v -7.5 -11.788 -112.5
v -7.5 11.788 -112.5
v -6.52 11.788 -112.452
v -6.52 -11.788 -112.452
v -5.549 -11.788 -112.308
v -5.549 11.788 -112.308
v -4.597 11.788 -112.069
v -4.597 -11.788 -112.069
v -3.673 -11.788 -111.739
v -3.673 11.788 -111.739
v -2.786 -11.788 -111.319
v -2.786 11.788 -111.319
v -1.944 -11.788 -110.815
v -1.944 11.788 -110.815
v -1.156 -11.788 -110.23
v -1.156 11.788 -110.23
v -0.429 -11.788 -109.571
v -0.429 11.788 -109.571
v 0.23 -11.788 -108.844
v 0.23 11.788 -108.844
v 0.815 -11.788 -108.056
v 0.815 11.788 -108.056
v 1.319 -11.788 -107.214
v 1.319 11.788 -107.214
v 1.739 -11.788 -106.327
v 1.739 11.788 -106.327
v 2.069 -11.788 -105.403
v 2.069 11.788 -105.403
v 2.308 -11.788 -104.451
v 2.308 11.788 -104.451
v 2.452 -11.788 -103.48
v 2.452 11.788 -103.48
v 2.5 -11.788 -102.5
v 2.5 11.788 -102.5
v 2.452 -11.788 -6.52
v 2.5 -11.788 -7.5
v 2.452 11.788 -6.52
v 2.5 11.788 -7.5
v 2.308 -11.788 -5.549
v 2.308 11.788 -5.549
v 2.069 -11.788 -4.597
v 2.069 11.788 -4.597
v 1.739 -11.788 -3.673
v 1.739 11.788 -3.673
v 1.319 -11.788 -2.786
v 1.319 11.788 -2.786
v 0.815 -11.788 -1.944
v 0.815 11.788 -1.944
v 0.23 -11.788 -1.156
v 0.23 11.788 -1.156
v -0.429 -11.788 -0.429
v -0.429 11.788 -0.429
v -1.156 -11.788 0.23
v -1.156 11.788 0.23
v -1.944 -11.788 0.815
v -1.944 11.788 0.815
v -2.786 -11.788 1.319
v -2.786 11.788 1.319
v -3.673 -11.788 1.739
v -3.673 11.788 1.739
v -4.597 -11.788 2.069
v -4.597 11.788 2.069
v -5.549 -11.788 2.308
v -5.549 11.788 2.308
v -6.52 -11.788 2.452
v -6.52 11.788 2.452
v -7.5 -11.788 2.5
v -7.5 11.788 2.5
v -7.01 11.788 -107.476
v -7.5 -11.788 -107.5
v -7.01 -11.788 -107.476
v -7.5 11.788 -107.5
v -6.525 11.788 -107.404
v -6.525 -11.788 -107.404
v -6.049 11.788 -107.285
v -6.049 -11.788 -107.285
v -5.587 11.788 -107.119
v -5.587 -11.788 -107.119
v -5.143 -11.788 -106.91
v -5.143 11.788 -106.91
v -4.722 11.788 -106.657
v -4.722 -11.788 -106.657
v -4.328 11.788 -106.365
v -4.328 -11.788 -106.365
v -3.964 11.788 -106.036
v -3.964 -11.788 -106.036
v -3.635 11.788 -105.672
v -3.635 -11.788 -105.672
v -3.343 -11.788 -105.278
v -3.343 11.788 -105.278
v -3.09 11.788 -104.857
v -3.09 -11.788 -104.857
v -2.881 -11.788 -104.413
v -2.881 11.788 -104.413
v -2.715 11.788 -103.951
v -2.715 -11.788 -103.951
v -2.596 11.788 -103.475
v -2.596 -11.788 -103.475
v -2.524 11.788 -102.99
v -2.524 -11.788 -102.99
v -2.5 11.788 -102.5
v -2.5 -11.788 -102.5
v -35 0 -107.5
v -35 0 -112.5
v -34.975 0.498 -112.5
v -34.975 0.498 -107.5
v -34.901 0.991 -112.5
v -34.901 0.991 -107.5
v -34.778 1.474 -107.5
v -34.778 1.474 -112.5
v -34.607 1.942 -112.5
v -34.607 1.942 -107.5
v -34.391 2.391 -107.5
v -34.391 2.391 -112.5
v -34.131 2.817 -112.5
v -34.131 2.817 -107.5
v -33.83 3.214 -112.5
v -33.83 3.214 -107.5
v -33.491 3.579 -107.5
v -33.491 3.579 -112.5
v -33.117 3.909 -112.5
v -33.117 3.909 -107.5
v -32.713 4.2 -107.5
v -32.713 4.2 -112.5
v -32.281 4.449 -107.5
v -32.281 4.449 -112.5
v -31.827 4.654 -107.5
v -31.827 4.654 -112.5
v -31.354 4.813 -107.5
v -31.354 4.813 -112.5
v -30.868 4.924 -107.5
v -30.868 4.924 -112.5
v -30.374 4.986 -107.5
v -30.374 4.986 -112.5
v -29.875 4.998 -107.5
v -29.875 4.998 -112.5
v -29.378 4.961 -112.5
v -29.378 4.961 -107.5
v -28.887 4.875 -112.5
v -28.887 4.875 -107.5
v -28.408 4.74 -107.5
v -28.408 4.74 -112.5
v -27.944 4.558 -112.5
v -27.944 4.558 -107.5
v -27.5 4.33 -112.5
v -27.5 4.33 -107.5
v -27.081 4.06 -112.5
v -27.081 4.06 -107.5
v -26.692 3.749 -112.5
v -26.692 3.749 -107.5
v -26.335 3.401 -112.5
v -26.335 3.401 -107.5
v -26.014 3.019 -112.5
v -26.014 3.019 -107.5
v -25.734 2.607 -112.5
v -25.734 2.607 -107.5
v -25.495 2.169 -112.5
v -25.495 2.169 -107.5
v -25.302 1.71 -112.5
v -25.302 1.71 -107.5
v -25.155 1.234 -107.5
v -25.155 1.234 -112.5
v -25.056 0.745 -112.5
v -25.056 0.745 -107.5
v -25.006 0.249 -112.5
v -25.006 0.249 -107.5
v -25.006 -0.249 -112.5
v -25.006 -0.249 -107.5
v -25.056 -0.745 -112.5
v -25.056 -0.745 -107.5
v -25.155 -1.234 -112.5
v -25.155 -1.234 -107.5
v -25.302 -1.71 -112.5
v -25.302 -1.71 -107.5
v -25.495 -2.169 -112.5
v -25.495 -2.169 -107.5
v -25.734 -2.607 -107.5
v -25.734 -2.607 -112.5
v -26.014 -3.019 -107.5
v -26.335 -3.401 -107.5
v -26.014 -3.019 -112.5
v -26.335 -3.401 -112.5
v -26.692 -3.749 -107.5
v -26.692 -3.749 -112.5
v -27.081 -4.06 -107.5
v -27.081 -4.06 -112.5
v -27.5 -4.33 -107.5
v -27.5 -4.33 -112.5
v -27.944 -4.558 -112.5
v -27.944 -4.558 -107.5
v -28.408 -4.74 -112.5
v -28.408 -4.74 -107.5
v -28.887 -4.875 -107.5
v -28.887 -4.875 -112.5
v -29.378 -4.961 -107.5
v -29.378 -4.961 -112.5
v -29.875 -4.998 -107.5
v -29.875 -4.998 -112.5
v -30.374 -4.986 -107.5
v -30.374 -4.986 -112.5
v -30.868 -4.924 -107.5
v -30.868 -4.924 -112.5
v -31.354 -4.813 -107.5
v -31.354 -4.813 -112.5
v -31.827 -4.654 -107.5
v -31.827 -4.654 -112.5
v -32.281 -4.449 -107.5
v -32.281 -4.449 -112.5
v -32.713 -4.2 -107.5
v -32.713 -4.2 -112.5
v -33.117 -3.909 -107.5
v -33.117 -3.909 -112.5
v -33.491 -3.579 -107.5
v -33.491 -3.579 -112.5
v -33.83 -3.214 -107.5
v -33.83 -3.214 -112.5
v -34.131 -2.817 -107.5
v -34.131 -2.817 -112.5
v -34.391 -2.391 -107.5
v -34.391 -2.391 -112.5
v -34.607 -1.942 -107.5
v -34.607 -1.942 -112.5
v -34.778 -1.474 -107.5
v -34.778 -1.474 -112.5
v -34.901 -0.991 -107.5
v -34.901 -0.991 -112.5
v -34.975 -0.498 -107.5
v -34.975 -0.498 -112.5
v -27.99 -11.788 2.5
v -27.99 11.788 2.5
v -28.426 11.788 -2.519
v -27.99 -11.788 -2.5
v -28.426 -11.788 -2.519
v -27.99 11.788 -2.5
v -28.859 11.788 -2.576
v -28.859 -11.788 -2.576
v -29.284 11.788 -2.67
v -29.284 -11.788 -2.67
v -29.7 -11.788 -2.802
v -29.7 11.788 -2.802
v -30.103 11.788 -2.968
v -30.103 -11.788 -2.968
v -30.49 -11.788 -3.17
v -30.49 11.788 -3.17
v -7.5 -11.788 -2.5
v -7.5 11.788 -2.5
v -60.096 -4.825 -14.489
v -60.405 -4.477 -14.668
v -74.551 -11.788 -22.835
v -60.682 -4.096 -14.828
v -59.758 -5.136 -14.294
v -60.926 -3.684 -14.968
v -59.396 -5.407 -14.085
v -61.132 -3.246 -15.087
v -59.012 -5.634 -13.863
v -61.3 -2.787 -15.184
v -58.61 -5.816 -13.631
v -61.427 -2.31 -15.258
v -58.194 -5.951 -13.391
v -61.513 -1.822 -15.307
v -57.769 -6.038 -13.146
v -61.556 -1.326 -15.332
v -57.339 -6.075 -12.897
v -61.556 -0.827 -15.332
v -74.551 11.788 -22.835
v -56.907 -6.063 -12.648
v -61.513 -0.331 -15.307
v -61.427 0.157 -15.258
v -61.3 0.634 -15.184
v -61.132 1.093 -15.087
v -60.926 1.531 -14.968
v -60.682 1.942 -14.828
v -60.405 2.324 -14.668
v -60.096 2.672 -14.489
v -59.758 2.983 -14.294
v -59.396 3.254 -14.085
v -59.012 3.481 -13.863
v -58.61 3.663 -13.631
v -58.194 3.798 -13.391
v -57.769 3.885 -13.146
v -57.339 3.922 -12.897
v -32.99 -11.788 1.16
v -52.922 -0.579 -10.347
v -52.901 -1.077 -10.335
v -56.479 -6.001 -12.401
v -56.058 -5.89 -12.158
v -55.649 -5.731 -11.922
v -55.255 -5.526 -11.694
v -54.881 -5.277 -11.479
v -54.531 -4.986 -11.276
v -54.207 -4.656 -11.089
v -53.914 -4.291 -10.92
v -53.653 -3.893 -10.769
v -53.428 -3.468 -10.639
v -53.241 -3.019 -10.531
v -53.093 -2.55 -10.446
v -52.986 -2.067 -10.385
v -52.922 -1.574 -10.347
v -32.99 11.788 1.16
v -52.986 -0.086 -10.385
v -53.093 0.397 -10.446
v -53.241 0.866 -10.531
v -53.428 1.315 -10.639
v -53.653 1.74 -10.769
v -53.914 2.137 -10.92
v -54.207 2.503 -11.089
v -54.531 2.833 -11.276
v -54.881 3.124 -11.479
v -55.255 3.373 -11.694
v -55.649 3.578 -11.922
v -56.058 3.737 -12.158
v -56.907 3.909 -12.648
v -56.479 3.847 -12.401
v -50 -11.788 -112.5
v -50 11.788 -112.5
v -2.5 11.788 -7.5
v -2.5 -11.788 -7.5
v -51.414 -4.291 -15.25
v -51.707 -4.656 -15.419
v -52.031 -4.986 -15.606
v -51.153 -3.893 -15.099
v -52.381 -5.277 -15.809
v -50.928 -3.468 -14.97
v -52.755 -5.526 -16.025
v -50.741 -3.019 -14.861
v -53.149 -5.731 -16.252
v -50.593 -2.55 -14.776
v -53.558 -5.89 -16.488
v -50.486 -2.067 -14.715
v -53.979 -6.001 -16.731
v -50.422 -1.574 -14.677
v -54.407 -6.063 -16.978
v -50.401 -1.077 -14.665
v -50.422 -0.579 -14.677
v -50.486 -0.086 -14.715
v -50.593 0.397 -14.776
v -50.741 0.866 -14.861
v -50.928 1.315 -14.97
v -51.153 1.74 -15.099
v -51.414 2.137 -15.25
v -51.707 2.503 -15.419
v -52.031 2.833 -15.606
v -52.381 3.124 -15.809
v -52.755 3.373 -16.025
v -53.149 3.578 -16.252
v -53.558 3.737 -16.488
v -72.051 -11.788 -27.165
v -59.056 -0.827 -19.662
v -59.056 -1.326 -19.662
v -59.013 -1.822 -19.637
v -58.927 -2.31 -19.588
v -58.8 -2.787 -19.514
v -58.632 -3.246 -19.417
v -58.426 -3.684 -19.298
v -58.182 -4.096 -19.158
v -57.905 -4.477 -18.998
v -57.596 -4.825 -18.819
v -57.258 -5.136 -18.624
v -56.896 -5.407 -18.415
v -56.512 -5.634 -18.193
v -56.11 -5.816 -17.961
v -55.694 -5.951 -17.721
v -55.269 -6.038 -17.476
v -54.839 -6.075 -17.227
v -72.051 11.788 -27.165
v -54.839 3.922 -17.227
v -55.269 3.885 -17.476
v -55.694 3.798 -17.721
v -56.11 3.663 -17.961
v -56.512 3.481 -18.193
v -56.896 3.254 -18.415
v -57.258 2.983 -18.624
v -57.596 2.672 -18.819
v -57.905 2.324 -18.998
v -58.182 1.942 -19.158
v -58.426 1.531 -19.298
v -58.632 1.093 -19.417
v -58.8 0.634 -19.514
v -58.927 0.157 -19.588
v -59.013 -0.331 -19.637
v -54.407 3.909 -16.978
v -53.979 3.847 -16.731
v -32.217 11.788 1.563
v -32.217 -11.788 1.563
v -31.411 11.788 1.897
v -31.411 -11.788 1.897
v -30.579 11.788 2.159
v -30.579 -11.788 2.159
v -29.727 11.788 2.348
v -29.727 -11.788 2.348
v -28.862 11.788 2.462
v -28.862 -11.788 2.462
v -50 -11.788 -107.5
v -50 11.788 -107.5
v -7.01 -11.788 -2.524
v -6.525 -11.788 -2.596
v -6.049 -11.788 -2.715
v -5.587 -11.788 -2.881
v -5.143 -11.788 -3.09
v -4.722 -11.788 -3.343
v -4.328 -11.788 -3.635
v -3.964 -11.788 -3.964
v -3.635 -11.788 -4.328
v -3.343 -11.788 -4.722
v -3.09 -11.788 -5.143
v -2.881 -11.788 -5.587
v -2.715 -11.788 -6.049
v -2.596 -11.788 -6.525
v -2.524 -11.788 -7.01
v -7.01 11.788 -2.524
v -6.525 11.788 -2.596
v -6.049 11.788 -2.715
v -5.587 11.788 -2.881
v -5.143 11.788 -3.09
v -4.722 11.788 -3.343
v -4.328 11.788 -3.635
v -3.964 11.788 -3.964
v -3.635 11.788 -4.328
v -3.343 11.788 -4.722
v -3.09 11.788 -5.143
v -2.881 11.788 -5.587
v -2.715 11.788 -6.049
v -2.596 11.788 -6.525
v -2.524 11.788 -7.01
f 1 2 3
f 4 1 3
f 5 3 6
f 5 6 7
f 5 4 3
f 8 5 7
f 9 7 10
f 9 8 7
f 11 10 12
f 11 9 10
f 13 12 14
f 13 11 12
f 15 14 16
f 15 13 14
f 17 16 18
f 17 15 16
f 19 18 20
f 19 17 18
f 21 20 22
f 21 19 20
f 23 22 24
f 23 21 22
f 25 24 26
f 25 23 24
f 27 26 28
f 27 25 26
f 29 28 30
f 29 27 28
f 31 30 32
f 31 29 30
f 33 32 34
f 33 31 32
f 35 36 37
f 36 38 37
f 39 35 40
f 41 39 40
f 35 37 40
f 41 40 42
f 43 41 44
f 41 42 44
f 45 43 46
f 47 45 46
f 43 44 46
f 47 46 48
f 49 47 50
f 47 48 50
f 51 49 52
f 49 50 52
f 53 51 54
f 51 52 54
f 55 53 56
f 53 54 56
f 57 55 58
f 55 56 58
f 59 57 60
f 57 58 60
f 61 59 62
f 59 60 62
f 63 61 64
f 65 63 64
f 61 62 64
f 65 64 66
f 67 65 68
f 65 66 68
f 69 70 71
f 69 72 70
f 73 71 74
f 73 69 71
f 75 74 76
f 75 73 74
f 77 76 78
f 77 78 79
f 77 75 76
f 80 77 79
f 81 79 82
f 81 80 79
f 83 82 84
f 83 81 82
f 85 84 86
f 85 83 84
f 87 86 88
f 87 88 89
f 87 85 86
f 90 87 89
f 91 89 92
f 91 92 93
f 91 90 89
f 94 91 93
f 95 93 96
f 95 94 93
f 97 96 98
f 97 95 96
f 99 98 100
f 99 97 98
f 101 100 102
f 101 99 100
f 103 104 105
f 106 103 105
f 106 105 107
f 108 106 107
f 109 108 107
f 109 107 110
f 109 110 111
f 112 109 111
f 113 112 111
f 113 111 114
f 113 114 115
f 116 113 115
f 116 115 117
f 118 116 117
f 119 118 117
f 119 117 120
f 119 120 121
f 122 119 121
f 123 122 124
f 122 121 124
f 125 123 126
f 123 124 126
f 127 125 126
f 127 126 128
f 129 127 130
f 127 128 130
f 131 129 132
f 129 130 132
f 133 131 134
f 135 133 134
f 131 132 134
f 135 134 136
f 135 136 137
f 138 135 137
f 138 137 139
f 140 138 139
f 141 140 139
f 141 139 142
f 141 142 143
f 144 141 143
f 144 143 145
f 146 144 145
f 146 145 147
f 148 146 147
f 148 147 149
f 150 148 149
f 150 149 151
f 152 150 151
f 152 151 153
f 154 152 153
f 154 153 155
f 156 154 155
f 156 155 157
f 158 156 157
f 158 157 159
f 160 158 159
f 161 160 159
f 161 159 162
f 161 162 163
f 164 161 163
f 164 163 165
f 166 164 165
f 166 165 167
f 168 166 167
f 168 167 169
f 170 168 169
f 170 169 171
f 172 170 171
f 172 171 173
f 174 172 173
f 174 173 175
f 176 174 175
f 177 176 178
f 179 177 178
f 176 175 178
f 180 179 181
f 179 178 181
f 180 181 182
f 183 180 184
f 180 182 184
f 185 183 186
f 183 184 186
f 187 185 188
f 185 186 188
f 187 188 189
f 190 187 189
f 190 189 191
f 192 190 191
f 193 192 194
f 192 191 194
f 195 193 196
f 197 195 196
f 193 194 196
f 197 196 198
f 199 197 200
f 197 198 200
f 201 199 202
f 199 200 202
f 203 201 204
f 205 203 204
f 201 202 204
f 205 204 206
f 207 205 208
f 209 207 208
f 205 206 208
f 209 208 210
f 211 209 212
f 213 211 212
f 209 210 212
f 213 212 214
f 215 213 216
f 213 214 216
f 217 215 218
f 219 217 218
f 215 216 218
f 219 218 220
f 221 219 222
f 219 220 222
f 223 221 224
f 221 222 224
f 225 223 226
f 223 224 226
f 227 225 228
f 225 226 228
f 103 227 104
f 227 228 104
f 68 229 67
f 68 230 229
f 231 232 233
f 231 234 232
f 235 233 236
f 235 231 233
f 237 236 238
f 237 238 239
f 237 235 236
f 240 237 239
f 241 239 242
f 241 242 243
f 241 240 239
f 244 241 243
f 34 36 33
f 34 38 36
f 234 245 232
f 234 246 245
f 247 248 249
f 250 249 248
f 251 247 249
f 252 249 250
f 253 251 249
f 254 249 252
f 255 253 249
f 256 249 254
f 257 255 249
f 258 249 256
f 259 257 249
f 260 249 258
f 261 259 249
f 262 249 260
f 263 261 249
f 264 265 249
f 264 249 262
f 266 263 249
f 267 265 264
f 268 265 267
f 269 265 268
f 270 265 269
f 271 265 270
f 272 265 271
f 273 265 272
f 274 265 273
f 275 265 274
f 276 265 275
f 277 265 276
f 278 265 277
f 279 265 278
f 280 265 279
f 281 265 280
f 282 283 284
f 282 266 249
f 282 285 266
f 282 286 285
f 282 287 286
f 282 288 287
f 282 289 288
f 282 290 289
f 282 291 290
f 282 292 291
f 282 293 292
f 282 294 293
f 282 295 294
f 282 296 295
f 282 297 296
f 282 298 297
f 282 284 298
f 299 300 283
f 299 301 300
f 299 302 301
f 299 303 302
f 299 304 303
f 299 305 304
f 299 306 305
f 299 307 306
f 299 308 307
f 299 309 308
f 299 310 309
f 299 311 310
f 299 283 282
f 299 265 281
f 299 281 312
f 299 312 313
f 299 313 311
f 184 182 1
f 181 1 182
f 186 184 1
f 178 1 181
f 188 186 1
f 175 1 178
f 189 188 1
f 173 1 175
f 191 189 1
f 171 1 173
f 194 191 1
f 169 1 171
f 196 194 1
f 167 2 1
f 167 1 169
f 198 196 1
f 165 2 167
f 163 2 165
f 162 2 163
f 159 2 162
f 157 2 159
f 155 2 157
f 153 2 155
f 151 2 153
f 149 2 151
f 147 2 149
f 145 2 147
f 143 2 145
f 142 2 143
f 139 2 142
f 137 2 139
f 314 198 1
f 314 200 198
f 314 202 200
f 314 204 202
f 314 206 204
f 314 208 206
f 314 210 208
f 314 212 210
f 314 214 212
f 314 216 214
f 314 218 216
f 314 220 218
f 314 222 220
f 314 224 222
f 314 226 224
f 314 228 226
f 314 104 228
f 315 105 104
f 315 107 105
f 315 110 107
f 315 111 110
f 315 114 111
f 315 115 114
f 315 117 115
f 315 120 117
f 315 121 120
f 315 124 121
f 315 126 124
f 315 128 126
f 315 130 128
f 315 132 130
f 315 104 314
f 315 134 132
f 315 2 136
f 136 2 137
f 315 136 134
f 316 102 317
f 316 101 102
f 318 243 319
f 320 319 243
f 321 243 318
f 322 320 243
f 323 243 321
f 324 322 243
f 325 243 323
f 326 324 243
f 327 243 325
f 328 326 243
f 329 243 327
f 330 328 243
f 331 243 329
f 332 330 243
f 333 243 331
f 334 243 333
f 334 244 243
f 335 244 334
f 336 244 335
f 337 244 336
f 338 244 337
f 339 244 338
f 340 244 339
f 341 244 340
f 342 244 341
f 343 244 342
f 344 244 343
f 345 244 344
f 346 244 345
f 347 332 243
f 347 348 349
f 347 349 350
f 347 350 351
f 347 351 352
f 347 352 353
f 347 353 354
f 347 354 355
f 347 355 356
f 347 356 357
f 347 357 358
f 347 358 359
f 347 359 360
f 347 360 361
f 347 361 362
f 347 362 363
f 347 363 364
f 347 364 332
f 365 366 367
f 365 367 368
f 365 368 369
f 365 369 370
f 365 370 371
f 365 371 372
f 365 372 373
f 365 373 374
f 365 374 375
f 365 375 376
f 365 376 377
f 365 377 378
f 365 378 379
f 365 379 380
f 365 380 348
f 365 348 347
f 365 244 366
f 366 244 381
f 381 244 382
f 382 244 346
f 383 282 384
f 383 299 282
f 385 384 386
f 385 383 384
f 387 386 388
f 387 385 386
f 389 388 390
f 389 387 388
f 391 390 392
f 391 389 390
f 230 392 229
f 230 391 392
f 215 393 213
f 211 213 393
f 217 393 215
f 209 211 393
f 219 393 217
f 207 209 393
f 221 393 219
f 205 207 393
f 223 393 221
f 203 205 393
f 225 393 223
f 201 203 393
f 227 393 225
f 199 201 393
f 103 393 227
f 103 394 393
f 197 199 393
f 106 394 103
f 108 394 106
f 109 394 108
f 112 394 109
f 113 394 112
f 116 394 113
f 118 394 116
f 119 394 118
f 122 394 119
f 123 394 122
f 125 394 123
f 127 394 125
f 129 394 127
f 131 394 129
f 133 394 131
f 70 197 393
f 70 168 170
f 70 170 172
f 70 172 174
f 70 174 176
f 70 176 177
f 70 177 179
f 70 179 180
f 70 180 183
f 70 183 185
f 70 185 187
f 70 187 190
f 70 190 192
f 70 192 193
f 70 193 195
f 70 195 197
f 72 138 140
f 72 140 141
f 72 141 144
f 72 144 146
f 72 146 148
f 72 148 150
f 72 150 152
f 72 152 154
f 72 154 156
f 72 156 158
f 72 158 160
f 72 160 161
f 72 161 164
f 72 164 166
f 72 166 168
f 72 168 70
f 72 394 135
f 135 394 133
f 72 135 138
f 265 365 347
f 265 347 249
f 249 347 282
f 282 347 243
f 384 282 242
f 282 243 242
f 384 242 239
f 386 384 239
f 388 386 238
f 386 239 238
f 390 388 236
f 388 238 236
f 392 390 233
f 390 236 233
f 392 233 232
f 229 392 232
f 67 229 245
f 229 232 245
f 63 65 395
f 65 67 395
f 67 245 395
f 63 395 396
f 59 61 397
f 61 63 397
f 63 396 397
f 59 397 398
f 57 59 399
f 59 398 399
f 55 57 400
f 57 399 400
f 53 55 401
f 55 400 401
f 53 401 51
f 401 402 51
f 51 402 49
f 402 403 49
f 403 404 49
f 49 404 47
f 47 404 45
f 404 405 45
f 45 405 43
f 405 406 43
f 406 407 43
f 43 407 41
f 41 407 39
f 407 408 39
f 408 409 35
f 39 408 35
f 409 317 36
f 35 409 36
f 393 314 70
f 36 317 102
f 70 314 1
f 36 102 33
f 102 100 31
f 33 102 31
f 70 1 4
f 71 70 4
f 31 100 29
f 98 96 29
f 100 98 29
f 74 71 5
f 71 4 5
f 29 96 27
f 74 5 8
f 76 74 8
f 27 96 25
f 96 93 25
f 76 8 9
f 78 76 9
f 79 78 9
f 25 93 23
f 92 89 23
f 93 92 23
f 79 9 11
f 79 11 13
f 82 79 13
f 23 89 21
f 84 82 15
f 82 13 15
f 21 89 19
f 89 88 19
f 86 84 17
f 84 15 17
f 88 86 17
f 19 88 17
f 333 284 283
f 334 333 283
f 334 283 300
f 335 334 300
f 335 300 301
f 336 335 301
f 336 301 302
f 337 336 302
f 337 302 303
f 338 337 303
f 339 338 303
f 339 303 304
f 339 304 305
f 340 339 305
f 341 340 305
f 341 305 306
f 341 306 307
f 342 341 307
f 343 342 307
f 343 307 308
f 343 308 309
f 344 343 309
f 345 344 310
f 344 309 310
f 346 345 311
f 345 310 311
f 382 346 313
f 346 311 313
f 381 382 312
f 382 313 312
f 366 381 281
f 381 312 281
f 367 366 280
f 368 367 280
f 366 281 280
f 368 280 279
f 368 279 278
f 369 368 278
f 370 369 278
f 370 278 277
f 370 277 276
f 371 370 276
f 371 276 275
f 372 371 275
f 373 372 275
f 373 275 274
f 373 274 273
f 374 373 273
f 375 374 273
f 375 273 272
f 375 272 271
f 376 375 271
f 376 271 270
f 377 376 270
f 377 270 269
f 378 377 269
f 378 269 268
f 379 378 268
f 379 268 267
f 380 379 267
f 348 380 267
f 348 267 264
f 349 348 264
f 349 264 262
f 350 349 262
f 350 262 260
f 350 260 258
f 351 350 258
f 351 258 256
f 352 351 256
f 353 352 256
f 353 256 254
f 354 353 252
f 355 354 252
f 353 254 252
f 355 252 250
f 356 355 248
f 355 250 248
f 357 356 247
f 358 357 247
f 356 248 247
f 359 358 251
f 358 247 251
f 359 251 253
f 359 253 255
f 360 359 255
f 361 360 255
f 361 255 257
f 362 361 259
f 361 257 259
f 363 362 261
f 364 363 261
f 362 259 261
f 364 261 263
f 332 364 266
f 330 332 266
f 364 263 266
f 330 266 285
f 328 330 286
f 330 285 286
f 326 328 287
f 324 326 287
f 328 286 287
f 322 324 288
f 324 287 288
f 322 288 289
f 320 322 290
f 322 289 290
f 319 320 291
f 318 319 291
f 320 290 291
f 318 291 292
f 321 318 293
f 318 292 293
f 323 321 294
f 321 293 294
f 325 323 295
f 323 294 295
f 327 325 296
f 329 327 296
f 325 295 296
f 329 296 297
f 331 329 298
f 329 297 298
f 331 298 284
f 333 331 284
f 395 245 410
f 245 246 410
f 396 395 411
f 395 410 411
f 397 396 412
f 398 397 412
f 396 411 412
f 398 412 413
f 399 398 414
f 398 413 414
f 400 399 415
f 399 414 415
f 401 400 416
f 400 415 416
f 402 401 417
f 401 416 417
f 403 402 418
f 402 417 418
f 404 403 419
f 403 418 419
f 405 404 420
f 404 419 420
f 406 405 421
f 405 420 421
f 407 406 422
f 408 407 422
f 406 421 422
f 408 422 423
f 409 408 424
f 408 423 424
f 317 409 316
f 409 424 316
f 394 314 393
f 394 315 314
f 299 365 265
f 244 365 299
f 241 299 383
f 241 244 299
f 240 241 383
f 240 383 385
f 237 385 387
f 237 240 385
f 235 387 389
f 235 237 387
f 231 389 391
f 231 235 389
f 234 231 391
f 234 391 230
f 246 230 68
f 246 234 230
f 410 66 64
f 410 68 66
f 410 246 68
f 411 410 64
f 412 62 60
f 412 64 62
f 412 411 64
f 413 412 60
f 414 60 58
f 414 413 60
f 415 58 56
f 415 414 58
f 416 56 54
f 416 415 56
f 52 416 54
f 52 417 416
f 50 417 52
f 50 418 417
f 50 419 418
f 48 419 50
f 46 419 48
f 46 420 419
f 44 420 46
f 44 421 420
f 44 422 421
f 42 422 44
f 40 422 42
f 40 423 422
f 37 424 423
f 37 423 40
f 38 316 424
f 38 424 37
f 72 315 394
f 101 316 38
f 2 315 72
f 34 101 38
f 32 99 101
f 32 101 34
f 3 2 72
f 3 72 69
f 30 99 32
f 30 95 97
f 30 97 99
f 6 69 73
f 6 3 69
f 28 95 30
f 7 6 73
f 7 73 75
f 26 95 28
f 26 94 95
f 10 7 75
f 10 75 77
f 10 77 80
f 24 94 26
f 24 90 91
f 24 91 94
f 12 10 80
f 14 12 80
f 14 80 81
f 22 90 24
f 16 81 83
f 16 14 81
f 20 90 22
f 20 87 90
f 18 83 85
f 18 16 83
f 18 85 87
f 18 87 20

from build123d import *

# Parameters (mm, degrees)
EXTRUDE_THIN1_DEPTH = 11.787987944
FILLET1_R           = 5
FILLET2_R           = 10
FILLET3_R           = 10
FILLET4_R           = 5
FILLET5_R           = 5
FILLET6_R           = 10
SKETCH3_R           = 5
CUT_EXTRUDE1_DEPTH  = 10
SKETCH5_R           = 5
CUT_EXTRUDE2_DEPTH  = 10


with BuildPart() as part:
    # Sketch1 → Extrude-Thin1 (new, symmetric)
    with BuildSketch(Plane(origin=(0, 0, 0), x_dir=(1, 0, 0), z_dir=(0, 1, 0))):
        Polygon((-50, 107.5), (-2.5, 107.5), (-2.5, 2.5), (-29.330127019, 2.5), (-72.051270189, 27.165063509), (-74.551270189, 22.834936491), (-30.669872981, -2.5), (2.5, -2.5), (2.5, 112.5), (-50, 112.5), align=None)
    extrude(amount=EXTRUDE_THIN1_DEPTH, both=True)

    # Fillet1
    fillet1_edges = [part.edges().sort_by_distance(p)[0] for p in [
        (-2.5, 0, -107.5),
    ]]
    fillet(fillet1_edges, radius=FILLET1_R)

    # Fillet2
    fillet2_edges = [part.edges().sort_by_distance(p)[0] for p in [
        (2.5, 0, -112.5),
    ]]
    fillet(fillet2_edges, radius=FILLET2_R)

    # Fillet3
    fillet3_edges = [part.edges().sort_by_distance(p)[0] for p in [
        (2.5, 0, 2.5),
    ]]
    fillet(fillet3_edges, radius=FILLET3_R)

    # Fillet4
    fillet4_edges = [part.edges().sort_by_distance(p)[0] for p in [
        (-2.5, 0, -2.5),
    ]]
    fillet(fillet4_edges, radius=FILLET4_R)

    # Fillet5
    fillet5_edges = [part.edges().sort_by_distance(p)[0] for p in [
        (-29.330127019, 0, -2.5),
    ]]
    fillet(fillet5_edges, radius=FILLET5_R)

    # Fillet6
    fillet6_edges = [part.edges().sort_by_distance(p)[0] for p in [
        (-30.669872981, 0, 2.5),
    ]]
    fillet(fillet6_edges, radius=FILLET6_R)

    # Sketch3 → Cut-Extrude1 (cut)
    with BuildSketch(Plane(origin=(0, 0, -112.5), x_dir=(-1, 0, 0), z_dir=(0, 0, -1))):
        with Locations((30, 0)):
            Circle(SKETCH3_R)
    extrude(amount=-CUT_EXTRUDE1_DEPTH, mode=Mode.SUBTRACT)

    # Sketch5 → Cut-Extrude2 (cut)
    with BuildSketch(Plane(origin=(-8.75, 0, 15.155444566), x_dir=(0.866025403784438, 0, 0.500000000000001), z_dir=(-0.500000000000001, 0, 0.866025403784438))):
        with Locations((-55.980762114, -1.07656789)):
            Circle(SKETCH5_R)
    extrude(amount=-CUT_EXTRUDE2_DEPTH, mode=Mode.SUBTRACT)


solid = part.part
